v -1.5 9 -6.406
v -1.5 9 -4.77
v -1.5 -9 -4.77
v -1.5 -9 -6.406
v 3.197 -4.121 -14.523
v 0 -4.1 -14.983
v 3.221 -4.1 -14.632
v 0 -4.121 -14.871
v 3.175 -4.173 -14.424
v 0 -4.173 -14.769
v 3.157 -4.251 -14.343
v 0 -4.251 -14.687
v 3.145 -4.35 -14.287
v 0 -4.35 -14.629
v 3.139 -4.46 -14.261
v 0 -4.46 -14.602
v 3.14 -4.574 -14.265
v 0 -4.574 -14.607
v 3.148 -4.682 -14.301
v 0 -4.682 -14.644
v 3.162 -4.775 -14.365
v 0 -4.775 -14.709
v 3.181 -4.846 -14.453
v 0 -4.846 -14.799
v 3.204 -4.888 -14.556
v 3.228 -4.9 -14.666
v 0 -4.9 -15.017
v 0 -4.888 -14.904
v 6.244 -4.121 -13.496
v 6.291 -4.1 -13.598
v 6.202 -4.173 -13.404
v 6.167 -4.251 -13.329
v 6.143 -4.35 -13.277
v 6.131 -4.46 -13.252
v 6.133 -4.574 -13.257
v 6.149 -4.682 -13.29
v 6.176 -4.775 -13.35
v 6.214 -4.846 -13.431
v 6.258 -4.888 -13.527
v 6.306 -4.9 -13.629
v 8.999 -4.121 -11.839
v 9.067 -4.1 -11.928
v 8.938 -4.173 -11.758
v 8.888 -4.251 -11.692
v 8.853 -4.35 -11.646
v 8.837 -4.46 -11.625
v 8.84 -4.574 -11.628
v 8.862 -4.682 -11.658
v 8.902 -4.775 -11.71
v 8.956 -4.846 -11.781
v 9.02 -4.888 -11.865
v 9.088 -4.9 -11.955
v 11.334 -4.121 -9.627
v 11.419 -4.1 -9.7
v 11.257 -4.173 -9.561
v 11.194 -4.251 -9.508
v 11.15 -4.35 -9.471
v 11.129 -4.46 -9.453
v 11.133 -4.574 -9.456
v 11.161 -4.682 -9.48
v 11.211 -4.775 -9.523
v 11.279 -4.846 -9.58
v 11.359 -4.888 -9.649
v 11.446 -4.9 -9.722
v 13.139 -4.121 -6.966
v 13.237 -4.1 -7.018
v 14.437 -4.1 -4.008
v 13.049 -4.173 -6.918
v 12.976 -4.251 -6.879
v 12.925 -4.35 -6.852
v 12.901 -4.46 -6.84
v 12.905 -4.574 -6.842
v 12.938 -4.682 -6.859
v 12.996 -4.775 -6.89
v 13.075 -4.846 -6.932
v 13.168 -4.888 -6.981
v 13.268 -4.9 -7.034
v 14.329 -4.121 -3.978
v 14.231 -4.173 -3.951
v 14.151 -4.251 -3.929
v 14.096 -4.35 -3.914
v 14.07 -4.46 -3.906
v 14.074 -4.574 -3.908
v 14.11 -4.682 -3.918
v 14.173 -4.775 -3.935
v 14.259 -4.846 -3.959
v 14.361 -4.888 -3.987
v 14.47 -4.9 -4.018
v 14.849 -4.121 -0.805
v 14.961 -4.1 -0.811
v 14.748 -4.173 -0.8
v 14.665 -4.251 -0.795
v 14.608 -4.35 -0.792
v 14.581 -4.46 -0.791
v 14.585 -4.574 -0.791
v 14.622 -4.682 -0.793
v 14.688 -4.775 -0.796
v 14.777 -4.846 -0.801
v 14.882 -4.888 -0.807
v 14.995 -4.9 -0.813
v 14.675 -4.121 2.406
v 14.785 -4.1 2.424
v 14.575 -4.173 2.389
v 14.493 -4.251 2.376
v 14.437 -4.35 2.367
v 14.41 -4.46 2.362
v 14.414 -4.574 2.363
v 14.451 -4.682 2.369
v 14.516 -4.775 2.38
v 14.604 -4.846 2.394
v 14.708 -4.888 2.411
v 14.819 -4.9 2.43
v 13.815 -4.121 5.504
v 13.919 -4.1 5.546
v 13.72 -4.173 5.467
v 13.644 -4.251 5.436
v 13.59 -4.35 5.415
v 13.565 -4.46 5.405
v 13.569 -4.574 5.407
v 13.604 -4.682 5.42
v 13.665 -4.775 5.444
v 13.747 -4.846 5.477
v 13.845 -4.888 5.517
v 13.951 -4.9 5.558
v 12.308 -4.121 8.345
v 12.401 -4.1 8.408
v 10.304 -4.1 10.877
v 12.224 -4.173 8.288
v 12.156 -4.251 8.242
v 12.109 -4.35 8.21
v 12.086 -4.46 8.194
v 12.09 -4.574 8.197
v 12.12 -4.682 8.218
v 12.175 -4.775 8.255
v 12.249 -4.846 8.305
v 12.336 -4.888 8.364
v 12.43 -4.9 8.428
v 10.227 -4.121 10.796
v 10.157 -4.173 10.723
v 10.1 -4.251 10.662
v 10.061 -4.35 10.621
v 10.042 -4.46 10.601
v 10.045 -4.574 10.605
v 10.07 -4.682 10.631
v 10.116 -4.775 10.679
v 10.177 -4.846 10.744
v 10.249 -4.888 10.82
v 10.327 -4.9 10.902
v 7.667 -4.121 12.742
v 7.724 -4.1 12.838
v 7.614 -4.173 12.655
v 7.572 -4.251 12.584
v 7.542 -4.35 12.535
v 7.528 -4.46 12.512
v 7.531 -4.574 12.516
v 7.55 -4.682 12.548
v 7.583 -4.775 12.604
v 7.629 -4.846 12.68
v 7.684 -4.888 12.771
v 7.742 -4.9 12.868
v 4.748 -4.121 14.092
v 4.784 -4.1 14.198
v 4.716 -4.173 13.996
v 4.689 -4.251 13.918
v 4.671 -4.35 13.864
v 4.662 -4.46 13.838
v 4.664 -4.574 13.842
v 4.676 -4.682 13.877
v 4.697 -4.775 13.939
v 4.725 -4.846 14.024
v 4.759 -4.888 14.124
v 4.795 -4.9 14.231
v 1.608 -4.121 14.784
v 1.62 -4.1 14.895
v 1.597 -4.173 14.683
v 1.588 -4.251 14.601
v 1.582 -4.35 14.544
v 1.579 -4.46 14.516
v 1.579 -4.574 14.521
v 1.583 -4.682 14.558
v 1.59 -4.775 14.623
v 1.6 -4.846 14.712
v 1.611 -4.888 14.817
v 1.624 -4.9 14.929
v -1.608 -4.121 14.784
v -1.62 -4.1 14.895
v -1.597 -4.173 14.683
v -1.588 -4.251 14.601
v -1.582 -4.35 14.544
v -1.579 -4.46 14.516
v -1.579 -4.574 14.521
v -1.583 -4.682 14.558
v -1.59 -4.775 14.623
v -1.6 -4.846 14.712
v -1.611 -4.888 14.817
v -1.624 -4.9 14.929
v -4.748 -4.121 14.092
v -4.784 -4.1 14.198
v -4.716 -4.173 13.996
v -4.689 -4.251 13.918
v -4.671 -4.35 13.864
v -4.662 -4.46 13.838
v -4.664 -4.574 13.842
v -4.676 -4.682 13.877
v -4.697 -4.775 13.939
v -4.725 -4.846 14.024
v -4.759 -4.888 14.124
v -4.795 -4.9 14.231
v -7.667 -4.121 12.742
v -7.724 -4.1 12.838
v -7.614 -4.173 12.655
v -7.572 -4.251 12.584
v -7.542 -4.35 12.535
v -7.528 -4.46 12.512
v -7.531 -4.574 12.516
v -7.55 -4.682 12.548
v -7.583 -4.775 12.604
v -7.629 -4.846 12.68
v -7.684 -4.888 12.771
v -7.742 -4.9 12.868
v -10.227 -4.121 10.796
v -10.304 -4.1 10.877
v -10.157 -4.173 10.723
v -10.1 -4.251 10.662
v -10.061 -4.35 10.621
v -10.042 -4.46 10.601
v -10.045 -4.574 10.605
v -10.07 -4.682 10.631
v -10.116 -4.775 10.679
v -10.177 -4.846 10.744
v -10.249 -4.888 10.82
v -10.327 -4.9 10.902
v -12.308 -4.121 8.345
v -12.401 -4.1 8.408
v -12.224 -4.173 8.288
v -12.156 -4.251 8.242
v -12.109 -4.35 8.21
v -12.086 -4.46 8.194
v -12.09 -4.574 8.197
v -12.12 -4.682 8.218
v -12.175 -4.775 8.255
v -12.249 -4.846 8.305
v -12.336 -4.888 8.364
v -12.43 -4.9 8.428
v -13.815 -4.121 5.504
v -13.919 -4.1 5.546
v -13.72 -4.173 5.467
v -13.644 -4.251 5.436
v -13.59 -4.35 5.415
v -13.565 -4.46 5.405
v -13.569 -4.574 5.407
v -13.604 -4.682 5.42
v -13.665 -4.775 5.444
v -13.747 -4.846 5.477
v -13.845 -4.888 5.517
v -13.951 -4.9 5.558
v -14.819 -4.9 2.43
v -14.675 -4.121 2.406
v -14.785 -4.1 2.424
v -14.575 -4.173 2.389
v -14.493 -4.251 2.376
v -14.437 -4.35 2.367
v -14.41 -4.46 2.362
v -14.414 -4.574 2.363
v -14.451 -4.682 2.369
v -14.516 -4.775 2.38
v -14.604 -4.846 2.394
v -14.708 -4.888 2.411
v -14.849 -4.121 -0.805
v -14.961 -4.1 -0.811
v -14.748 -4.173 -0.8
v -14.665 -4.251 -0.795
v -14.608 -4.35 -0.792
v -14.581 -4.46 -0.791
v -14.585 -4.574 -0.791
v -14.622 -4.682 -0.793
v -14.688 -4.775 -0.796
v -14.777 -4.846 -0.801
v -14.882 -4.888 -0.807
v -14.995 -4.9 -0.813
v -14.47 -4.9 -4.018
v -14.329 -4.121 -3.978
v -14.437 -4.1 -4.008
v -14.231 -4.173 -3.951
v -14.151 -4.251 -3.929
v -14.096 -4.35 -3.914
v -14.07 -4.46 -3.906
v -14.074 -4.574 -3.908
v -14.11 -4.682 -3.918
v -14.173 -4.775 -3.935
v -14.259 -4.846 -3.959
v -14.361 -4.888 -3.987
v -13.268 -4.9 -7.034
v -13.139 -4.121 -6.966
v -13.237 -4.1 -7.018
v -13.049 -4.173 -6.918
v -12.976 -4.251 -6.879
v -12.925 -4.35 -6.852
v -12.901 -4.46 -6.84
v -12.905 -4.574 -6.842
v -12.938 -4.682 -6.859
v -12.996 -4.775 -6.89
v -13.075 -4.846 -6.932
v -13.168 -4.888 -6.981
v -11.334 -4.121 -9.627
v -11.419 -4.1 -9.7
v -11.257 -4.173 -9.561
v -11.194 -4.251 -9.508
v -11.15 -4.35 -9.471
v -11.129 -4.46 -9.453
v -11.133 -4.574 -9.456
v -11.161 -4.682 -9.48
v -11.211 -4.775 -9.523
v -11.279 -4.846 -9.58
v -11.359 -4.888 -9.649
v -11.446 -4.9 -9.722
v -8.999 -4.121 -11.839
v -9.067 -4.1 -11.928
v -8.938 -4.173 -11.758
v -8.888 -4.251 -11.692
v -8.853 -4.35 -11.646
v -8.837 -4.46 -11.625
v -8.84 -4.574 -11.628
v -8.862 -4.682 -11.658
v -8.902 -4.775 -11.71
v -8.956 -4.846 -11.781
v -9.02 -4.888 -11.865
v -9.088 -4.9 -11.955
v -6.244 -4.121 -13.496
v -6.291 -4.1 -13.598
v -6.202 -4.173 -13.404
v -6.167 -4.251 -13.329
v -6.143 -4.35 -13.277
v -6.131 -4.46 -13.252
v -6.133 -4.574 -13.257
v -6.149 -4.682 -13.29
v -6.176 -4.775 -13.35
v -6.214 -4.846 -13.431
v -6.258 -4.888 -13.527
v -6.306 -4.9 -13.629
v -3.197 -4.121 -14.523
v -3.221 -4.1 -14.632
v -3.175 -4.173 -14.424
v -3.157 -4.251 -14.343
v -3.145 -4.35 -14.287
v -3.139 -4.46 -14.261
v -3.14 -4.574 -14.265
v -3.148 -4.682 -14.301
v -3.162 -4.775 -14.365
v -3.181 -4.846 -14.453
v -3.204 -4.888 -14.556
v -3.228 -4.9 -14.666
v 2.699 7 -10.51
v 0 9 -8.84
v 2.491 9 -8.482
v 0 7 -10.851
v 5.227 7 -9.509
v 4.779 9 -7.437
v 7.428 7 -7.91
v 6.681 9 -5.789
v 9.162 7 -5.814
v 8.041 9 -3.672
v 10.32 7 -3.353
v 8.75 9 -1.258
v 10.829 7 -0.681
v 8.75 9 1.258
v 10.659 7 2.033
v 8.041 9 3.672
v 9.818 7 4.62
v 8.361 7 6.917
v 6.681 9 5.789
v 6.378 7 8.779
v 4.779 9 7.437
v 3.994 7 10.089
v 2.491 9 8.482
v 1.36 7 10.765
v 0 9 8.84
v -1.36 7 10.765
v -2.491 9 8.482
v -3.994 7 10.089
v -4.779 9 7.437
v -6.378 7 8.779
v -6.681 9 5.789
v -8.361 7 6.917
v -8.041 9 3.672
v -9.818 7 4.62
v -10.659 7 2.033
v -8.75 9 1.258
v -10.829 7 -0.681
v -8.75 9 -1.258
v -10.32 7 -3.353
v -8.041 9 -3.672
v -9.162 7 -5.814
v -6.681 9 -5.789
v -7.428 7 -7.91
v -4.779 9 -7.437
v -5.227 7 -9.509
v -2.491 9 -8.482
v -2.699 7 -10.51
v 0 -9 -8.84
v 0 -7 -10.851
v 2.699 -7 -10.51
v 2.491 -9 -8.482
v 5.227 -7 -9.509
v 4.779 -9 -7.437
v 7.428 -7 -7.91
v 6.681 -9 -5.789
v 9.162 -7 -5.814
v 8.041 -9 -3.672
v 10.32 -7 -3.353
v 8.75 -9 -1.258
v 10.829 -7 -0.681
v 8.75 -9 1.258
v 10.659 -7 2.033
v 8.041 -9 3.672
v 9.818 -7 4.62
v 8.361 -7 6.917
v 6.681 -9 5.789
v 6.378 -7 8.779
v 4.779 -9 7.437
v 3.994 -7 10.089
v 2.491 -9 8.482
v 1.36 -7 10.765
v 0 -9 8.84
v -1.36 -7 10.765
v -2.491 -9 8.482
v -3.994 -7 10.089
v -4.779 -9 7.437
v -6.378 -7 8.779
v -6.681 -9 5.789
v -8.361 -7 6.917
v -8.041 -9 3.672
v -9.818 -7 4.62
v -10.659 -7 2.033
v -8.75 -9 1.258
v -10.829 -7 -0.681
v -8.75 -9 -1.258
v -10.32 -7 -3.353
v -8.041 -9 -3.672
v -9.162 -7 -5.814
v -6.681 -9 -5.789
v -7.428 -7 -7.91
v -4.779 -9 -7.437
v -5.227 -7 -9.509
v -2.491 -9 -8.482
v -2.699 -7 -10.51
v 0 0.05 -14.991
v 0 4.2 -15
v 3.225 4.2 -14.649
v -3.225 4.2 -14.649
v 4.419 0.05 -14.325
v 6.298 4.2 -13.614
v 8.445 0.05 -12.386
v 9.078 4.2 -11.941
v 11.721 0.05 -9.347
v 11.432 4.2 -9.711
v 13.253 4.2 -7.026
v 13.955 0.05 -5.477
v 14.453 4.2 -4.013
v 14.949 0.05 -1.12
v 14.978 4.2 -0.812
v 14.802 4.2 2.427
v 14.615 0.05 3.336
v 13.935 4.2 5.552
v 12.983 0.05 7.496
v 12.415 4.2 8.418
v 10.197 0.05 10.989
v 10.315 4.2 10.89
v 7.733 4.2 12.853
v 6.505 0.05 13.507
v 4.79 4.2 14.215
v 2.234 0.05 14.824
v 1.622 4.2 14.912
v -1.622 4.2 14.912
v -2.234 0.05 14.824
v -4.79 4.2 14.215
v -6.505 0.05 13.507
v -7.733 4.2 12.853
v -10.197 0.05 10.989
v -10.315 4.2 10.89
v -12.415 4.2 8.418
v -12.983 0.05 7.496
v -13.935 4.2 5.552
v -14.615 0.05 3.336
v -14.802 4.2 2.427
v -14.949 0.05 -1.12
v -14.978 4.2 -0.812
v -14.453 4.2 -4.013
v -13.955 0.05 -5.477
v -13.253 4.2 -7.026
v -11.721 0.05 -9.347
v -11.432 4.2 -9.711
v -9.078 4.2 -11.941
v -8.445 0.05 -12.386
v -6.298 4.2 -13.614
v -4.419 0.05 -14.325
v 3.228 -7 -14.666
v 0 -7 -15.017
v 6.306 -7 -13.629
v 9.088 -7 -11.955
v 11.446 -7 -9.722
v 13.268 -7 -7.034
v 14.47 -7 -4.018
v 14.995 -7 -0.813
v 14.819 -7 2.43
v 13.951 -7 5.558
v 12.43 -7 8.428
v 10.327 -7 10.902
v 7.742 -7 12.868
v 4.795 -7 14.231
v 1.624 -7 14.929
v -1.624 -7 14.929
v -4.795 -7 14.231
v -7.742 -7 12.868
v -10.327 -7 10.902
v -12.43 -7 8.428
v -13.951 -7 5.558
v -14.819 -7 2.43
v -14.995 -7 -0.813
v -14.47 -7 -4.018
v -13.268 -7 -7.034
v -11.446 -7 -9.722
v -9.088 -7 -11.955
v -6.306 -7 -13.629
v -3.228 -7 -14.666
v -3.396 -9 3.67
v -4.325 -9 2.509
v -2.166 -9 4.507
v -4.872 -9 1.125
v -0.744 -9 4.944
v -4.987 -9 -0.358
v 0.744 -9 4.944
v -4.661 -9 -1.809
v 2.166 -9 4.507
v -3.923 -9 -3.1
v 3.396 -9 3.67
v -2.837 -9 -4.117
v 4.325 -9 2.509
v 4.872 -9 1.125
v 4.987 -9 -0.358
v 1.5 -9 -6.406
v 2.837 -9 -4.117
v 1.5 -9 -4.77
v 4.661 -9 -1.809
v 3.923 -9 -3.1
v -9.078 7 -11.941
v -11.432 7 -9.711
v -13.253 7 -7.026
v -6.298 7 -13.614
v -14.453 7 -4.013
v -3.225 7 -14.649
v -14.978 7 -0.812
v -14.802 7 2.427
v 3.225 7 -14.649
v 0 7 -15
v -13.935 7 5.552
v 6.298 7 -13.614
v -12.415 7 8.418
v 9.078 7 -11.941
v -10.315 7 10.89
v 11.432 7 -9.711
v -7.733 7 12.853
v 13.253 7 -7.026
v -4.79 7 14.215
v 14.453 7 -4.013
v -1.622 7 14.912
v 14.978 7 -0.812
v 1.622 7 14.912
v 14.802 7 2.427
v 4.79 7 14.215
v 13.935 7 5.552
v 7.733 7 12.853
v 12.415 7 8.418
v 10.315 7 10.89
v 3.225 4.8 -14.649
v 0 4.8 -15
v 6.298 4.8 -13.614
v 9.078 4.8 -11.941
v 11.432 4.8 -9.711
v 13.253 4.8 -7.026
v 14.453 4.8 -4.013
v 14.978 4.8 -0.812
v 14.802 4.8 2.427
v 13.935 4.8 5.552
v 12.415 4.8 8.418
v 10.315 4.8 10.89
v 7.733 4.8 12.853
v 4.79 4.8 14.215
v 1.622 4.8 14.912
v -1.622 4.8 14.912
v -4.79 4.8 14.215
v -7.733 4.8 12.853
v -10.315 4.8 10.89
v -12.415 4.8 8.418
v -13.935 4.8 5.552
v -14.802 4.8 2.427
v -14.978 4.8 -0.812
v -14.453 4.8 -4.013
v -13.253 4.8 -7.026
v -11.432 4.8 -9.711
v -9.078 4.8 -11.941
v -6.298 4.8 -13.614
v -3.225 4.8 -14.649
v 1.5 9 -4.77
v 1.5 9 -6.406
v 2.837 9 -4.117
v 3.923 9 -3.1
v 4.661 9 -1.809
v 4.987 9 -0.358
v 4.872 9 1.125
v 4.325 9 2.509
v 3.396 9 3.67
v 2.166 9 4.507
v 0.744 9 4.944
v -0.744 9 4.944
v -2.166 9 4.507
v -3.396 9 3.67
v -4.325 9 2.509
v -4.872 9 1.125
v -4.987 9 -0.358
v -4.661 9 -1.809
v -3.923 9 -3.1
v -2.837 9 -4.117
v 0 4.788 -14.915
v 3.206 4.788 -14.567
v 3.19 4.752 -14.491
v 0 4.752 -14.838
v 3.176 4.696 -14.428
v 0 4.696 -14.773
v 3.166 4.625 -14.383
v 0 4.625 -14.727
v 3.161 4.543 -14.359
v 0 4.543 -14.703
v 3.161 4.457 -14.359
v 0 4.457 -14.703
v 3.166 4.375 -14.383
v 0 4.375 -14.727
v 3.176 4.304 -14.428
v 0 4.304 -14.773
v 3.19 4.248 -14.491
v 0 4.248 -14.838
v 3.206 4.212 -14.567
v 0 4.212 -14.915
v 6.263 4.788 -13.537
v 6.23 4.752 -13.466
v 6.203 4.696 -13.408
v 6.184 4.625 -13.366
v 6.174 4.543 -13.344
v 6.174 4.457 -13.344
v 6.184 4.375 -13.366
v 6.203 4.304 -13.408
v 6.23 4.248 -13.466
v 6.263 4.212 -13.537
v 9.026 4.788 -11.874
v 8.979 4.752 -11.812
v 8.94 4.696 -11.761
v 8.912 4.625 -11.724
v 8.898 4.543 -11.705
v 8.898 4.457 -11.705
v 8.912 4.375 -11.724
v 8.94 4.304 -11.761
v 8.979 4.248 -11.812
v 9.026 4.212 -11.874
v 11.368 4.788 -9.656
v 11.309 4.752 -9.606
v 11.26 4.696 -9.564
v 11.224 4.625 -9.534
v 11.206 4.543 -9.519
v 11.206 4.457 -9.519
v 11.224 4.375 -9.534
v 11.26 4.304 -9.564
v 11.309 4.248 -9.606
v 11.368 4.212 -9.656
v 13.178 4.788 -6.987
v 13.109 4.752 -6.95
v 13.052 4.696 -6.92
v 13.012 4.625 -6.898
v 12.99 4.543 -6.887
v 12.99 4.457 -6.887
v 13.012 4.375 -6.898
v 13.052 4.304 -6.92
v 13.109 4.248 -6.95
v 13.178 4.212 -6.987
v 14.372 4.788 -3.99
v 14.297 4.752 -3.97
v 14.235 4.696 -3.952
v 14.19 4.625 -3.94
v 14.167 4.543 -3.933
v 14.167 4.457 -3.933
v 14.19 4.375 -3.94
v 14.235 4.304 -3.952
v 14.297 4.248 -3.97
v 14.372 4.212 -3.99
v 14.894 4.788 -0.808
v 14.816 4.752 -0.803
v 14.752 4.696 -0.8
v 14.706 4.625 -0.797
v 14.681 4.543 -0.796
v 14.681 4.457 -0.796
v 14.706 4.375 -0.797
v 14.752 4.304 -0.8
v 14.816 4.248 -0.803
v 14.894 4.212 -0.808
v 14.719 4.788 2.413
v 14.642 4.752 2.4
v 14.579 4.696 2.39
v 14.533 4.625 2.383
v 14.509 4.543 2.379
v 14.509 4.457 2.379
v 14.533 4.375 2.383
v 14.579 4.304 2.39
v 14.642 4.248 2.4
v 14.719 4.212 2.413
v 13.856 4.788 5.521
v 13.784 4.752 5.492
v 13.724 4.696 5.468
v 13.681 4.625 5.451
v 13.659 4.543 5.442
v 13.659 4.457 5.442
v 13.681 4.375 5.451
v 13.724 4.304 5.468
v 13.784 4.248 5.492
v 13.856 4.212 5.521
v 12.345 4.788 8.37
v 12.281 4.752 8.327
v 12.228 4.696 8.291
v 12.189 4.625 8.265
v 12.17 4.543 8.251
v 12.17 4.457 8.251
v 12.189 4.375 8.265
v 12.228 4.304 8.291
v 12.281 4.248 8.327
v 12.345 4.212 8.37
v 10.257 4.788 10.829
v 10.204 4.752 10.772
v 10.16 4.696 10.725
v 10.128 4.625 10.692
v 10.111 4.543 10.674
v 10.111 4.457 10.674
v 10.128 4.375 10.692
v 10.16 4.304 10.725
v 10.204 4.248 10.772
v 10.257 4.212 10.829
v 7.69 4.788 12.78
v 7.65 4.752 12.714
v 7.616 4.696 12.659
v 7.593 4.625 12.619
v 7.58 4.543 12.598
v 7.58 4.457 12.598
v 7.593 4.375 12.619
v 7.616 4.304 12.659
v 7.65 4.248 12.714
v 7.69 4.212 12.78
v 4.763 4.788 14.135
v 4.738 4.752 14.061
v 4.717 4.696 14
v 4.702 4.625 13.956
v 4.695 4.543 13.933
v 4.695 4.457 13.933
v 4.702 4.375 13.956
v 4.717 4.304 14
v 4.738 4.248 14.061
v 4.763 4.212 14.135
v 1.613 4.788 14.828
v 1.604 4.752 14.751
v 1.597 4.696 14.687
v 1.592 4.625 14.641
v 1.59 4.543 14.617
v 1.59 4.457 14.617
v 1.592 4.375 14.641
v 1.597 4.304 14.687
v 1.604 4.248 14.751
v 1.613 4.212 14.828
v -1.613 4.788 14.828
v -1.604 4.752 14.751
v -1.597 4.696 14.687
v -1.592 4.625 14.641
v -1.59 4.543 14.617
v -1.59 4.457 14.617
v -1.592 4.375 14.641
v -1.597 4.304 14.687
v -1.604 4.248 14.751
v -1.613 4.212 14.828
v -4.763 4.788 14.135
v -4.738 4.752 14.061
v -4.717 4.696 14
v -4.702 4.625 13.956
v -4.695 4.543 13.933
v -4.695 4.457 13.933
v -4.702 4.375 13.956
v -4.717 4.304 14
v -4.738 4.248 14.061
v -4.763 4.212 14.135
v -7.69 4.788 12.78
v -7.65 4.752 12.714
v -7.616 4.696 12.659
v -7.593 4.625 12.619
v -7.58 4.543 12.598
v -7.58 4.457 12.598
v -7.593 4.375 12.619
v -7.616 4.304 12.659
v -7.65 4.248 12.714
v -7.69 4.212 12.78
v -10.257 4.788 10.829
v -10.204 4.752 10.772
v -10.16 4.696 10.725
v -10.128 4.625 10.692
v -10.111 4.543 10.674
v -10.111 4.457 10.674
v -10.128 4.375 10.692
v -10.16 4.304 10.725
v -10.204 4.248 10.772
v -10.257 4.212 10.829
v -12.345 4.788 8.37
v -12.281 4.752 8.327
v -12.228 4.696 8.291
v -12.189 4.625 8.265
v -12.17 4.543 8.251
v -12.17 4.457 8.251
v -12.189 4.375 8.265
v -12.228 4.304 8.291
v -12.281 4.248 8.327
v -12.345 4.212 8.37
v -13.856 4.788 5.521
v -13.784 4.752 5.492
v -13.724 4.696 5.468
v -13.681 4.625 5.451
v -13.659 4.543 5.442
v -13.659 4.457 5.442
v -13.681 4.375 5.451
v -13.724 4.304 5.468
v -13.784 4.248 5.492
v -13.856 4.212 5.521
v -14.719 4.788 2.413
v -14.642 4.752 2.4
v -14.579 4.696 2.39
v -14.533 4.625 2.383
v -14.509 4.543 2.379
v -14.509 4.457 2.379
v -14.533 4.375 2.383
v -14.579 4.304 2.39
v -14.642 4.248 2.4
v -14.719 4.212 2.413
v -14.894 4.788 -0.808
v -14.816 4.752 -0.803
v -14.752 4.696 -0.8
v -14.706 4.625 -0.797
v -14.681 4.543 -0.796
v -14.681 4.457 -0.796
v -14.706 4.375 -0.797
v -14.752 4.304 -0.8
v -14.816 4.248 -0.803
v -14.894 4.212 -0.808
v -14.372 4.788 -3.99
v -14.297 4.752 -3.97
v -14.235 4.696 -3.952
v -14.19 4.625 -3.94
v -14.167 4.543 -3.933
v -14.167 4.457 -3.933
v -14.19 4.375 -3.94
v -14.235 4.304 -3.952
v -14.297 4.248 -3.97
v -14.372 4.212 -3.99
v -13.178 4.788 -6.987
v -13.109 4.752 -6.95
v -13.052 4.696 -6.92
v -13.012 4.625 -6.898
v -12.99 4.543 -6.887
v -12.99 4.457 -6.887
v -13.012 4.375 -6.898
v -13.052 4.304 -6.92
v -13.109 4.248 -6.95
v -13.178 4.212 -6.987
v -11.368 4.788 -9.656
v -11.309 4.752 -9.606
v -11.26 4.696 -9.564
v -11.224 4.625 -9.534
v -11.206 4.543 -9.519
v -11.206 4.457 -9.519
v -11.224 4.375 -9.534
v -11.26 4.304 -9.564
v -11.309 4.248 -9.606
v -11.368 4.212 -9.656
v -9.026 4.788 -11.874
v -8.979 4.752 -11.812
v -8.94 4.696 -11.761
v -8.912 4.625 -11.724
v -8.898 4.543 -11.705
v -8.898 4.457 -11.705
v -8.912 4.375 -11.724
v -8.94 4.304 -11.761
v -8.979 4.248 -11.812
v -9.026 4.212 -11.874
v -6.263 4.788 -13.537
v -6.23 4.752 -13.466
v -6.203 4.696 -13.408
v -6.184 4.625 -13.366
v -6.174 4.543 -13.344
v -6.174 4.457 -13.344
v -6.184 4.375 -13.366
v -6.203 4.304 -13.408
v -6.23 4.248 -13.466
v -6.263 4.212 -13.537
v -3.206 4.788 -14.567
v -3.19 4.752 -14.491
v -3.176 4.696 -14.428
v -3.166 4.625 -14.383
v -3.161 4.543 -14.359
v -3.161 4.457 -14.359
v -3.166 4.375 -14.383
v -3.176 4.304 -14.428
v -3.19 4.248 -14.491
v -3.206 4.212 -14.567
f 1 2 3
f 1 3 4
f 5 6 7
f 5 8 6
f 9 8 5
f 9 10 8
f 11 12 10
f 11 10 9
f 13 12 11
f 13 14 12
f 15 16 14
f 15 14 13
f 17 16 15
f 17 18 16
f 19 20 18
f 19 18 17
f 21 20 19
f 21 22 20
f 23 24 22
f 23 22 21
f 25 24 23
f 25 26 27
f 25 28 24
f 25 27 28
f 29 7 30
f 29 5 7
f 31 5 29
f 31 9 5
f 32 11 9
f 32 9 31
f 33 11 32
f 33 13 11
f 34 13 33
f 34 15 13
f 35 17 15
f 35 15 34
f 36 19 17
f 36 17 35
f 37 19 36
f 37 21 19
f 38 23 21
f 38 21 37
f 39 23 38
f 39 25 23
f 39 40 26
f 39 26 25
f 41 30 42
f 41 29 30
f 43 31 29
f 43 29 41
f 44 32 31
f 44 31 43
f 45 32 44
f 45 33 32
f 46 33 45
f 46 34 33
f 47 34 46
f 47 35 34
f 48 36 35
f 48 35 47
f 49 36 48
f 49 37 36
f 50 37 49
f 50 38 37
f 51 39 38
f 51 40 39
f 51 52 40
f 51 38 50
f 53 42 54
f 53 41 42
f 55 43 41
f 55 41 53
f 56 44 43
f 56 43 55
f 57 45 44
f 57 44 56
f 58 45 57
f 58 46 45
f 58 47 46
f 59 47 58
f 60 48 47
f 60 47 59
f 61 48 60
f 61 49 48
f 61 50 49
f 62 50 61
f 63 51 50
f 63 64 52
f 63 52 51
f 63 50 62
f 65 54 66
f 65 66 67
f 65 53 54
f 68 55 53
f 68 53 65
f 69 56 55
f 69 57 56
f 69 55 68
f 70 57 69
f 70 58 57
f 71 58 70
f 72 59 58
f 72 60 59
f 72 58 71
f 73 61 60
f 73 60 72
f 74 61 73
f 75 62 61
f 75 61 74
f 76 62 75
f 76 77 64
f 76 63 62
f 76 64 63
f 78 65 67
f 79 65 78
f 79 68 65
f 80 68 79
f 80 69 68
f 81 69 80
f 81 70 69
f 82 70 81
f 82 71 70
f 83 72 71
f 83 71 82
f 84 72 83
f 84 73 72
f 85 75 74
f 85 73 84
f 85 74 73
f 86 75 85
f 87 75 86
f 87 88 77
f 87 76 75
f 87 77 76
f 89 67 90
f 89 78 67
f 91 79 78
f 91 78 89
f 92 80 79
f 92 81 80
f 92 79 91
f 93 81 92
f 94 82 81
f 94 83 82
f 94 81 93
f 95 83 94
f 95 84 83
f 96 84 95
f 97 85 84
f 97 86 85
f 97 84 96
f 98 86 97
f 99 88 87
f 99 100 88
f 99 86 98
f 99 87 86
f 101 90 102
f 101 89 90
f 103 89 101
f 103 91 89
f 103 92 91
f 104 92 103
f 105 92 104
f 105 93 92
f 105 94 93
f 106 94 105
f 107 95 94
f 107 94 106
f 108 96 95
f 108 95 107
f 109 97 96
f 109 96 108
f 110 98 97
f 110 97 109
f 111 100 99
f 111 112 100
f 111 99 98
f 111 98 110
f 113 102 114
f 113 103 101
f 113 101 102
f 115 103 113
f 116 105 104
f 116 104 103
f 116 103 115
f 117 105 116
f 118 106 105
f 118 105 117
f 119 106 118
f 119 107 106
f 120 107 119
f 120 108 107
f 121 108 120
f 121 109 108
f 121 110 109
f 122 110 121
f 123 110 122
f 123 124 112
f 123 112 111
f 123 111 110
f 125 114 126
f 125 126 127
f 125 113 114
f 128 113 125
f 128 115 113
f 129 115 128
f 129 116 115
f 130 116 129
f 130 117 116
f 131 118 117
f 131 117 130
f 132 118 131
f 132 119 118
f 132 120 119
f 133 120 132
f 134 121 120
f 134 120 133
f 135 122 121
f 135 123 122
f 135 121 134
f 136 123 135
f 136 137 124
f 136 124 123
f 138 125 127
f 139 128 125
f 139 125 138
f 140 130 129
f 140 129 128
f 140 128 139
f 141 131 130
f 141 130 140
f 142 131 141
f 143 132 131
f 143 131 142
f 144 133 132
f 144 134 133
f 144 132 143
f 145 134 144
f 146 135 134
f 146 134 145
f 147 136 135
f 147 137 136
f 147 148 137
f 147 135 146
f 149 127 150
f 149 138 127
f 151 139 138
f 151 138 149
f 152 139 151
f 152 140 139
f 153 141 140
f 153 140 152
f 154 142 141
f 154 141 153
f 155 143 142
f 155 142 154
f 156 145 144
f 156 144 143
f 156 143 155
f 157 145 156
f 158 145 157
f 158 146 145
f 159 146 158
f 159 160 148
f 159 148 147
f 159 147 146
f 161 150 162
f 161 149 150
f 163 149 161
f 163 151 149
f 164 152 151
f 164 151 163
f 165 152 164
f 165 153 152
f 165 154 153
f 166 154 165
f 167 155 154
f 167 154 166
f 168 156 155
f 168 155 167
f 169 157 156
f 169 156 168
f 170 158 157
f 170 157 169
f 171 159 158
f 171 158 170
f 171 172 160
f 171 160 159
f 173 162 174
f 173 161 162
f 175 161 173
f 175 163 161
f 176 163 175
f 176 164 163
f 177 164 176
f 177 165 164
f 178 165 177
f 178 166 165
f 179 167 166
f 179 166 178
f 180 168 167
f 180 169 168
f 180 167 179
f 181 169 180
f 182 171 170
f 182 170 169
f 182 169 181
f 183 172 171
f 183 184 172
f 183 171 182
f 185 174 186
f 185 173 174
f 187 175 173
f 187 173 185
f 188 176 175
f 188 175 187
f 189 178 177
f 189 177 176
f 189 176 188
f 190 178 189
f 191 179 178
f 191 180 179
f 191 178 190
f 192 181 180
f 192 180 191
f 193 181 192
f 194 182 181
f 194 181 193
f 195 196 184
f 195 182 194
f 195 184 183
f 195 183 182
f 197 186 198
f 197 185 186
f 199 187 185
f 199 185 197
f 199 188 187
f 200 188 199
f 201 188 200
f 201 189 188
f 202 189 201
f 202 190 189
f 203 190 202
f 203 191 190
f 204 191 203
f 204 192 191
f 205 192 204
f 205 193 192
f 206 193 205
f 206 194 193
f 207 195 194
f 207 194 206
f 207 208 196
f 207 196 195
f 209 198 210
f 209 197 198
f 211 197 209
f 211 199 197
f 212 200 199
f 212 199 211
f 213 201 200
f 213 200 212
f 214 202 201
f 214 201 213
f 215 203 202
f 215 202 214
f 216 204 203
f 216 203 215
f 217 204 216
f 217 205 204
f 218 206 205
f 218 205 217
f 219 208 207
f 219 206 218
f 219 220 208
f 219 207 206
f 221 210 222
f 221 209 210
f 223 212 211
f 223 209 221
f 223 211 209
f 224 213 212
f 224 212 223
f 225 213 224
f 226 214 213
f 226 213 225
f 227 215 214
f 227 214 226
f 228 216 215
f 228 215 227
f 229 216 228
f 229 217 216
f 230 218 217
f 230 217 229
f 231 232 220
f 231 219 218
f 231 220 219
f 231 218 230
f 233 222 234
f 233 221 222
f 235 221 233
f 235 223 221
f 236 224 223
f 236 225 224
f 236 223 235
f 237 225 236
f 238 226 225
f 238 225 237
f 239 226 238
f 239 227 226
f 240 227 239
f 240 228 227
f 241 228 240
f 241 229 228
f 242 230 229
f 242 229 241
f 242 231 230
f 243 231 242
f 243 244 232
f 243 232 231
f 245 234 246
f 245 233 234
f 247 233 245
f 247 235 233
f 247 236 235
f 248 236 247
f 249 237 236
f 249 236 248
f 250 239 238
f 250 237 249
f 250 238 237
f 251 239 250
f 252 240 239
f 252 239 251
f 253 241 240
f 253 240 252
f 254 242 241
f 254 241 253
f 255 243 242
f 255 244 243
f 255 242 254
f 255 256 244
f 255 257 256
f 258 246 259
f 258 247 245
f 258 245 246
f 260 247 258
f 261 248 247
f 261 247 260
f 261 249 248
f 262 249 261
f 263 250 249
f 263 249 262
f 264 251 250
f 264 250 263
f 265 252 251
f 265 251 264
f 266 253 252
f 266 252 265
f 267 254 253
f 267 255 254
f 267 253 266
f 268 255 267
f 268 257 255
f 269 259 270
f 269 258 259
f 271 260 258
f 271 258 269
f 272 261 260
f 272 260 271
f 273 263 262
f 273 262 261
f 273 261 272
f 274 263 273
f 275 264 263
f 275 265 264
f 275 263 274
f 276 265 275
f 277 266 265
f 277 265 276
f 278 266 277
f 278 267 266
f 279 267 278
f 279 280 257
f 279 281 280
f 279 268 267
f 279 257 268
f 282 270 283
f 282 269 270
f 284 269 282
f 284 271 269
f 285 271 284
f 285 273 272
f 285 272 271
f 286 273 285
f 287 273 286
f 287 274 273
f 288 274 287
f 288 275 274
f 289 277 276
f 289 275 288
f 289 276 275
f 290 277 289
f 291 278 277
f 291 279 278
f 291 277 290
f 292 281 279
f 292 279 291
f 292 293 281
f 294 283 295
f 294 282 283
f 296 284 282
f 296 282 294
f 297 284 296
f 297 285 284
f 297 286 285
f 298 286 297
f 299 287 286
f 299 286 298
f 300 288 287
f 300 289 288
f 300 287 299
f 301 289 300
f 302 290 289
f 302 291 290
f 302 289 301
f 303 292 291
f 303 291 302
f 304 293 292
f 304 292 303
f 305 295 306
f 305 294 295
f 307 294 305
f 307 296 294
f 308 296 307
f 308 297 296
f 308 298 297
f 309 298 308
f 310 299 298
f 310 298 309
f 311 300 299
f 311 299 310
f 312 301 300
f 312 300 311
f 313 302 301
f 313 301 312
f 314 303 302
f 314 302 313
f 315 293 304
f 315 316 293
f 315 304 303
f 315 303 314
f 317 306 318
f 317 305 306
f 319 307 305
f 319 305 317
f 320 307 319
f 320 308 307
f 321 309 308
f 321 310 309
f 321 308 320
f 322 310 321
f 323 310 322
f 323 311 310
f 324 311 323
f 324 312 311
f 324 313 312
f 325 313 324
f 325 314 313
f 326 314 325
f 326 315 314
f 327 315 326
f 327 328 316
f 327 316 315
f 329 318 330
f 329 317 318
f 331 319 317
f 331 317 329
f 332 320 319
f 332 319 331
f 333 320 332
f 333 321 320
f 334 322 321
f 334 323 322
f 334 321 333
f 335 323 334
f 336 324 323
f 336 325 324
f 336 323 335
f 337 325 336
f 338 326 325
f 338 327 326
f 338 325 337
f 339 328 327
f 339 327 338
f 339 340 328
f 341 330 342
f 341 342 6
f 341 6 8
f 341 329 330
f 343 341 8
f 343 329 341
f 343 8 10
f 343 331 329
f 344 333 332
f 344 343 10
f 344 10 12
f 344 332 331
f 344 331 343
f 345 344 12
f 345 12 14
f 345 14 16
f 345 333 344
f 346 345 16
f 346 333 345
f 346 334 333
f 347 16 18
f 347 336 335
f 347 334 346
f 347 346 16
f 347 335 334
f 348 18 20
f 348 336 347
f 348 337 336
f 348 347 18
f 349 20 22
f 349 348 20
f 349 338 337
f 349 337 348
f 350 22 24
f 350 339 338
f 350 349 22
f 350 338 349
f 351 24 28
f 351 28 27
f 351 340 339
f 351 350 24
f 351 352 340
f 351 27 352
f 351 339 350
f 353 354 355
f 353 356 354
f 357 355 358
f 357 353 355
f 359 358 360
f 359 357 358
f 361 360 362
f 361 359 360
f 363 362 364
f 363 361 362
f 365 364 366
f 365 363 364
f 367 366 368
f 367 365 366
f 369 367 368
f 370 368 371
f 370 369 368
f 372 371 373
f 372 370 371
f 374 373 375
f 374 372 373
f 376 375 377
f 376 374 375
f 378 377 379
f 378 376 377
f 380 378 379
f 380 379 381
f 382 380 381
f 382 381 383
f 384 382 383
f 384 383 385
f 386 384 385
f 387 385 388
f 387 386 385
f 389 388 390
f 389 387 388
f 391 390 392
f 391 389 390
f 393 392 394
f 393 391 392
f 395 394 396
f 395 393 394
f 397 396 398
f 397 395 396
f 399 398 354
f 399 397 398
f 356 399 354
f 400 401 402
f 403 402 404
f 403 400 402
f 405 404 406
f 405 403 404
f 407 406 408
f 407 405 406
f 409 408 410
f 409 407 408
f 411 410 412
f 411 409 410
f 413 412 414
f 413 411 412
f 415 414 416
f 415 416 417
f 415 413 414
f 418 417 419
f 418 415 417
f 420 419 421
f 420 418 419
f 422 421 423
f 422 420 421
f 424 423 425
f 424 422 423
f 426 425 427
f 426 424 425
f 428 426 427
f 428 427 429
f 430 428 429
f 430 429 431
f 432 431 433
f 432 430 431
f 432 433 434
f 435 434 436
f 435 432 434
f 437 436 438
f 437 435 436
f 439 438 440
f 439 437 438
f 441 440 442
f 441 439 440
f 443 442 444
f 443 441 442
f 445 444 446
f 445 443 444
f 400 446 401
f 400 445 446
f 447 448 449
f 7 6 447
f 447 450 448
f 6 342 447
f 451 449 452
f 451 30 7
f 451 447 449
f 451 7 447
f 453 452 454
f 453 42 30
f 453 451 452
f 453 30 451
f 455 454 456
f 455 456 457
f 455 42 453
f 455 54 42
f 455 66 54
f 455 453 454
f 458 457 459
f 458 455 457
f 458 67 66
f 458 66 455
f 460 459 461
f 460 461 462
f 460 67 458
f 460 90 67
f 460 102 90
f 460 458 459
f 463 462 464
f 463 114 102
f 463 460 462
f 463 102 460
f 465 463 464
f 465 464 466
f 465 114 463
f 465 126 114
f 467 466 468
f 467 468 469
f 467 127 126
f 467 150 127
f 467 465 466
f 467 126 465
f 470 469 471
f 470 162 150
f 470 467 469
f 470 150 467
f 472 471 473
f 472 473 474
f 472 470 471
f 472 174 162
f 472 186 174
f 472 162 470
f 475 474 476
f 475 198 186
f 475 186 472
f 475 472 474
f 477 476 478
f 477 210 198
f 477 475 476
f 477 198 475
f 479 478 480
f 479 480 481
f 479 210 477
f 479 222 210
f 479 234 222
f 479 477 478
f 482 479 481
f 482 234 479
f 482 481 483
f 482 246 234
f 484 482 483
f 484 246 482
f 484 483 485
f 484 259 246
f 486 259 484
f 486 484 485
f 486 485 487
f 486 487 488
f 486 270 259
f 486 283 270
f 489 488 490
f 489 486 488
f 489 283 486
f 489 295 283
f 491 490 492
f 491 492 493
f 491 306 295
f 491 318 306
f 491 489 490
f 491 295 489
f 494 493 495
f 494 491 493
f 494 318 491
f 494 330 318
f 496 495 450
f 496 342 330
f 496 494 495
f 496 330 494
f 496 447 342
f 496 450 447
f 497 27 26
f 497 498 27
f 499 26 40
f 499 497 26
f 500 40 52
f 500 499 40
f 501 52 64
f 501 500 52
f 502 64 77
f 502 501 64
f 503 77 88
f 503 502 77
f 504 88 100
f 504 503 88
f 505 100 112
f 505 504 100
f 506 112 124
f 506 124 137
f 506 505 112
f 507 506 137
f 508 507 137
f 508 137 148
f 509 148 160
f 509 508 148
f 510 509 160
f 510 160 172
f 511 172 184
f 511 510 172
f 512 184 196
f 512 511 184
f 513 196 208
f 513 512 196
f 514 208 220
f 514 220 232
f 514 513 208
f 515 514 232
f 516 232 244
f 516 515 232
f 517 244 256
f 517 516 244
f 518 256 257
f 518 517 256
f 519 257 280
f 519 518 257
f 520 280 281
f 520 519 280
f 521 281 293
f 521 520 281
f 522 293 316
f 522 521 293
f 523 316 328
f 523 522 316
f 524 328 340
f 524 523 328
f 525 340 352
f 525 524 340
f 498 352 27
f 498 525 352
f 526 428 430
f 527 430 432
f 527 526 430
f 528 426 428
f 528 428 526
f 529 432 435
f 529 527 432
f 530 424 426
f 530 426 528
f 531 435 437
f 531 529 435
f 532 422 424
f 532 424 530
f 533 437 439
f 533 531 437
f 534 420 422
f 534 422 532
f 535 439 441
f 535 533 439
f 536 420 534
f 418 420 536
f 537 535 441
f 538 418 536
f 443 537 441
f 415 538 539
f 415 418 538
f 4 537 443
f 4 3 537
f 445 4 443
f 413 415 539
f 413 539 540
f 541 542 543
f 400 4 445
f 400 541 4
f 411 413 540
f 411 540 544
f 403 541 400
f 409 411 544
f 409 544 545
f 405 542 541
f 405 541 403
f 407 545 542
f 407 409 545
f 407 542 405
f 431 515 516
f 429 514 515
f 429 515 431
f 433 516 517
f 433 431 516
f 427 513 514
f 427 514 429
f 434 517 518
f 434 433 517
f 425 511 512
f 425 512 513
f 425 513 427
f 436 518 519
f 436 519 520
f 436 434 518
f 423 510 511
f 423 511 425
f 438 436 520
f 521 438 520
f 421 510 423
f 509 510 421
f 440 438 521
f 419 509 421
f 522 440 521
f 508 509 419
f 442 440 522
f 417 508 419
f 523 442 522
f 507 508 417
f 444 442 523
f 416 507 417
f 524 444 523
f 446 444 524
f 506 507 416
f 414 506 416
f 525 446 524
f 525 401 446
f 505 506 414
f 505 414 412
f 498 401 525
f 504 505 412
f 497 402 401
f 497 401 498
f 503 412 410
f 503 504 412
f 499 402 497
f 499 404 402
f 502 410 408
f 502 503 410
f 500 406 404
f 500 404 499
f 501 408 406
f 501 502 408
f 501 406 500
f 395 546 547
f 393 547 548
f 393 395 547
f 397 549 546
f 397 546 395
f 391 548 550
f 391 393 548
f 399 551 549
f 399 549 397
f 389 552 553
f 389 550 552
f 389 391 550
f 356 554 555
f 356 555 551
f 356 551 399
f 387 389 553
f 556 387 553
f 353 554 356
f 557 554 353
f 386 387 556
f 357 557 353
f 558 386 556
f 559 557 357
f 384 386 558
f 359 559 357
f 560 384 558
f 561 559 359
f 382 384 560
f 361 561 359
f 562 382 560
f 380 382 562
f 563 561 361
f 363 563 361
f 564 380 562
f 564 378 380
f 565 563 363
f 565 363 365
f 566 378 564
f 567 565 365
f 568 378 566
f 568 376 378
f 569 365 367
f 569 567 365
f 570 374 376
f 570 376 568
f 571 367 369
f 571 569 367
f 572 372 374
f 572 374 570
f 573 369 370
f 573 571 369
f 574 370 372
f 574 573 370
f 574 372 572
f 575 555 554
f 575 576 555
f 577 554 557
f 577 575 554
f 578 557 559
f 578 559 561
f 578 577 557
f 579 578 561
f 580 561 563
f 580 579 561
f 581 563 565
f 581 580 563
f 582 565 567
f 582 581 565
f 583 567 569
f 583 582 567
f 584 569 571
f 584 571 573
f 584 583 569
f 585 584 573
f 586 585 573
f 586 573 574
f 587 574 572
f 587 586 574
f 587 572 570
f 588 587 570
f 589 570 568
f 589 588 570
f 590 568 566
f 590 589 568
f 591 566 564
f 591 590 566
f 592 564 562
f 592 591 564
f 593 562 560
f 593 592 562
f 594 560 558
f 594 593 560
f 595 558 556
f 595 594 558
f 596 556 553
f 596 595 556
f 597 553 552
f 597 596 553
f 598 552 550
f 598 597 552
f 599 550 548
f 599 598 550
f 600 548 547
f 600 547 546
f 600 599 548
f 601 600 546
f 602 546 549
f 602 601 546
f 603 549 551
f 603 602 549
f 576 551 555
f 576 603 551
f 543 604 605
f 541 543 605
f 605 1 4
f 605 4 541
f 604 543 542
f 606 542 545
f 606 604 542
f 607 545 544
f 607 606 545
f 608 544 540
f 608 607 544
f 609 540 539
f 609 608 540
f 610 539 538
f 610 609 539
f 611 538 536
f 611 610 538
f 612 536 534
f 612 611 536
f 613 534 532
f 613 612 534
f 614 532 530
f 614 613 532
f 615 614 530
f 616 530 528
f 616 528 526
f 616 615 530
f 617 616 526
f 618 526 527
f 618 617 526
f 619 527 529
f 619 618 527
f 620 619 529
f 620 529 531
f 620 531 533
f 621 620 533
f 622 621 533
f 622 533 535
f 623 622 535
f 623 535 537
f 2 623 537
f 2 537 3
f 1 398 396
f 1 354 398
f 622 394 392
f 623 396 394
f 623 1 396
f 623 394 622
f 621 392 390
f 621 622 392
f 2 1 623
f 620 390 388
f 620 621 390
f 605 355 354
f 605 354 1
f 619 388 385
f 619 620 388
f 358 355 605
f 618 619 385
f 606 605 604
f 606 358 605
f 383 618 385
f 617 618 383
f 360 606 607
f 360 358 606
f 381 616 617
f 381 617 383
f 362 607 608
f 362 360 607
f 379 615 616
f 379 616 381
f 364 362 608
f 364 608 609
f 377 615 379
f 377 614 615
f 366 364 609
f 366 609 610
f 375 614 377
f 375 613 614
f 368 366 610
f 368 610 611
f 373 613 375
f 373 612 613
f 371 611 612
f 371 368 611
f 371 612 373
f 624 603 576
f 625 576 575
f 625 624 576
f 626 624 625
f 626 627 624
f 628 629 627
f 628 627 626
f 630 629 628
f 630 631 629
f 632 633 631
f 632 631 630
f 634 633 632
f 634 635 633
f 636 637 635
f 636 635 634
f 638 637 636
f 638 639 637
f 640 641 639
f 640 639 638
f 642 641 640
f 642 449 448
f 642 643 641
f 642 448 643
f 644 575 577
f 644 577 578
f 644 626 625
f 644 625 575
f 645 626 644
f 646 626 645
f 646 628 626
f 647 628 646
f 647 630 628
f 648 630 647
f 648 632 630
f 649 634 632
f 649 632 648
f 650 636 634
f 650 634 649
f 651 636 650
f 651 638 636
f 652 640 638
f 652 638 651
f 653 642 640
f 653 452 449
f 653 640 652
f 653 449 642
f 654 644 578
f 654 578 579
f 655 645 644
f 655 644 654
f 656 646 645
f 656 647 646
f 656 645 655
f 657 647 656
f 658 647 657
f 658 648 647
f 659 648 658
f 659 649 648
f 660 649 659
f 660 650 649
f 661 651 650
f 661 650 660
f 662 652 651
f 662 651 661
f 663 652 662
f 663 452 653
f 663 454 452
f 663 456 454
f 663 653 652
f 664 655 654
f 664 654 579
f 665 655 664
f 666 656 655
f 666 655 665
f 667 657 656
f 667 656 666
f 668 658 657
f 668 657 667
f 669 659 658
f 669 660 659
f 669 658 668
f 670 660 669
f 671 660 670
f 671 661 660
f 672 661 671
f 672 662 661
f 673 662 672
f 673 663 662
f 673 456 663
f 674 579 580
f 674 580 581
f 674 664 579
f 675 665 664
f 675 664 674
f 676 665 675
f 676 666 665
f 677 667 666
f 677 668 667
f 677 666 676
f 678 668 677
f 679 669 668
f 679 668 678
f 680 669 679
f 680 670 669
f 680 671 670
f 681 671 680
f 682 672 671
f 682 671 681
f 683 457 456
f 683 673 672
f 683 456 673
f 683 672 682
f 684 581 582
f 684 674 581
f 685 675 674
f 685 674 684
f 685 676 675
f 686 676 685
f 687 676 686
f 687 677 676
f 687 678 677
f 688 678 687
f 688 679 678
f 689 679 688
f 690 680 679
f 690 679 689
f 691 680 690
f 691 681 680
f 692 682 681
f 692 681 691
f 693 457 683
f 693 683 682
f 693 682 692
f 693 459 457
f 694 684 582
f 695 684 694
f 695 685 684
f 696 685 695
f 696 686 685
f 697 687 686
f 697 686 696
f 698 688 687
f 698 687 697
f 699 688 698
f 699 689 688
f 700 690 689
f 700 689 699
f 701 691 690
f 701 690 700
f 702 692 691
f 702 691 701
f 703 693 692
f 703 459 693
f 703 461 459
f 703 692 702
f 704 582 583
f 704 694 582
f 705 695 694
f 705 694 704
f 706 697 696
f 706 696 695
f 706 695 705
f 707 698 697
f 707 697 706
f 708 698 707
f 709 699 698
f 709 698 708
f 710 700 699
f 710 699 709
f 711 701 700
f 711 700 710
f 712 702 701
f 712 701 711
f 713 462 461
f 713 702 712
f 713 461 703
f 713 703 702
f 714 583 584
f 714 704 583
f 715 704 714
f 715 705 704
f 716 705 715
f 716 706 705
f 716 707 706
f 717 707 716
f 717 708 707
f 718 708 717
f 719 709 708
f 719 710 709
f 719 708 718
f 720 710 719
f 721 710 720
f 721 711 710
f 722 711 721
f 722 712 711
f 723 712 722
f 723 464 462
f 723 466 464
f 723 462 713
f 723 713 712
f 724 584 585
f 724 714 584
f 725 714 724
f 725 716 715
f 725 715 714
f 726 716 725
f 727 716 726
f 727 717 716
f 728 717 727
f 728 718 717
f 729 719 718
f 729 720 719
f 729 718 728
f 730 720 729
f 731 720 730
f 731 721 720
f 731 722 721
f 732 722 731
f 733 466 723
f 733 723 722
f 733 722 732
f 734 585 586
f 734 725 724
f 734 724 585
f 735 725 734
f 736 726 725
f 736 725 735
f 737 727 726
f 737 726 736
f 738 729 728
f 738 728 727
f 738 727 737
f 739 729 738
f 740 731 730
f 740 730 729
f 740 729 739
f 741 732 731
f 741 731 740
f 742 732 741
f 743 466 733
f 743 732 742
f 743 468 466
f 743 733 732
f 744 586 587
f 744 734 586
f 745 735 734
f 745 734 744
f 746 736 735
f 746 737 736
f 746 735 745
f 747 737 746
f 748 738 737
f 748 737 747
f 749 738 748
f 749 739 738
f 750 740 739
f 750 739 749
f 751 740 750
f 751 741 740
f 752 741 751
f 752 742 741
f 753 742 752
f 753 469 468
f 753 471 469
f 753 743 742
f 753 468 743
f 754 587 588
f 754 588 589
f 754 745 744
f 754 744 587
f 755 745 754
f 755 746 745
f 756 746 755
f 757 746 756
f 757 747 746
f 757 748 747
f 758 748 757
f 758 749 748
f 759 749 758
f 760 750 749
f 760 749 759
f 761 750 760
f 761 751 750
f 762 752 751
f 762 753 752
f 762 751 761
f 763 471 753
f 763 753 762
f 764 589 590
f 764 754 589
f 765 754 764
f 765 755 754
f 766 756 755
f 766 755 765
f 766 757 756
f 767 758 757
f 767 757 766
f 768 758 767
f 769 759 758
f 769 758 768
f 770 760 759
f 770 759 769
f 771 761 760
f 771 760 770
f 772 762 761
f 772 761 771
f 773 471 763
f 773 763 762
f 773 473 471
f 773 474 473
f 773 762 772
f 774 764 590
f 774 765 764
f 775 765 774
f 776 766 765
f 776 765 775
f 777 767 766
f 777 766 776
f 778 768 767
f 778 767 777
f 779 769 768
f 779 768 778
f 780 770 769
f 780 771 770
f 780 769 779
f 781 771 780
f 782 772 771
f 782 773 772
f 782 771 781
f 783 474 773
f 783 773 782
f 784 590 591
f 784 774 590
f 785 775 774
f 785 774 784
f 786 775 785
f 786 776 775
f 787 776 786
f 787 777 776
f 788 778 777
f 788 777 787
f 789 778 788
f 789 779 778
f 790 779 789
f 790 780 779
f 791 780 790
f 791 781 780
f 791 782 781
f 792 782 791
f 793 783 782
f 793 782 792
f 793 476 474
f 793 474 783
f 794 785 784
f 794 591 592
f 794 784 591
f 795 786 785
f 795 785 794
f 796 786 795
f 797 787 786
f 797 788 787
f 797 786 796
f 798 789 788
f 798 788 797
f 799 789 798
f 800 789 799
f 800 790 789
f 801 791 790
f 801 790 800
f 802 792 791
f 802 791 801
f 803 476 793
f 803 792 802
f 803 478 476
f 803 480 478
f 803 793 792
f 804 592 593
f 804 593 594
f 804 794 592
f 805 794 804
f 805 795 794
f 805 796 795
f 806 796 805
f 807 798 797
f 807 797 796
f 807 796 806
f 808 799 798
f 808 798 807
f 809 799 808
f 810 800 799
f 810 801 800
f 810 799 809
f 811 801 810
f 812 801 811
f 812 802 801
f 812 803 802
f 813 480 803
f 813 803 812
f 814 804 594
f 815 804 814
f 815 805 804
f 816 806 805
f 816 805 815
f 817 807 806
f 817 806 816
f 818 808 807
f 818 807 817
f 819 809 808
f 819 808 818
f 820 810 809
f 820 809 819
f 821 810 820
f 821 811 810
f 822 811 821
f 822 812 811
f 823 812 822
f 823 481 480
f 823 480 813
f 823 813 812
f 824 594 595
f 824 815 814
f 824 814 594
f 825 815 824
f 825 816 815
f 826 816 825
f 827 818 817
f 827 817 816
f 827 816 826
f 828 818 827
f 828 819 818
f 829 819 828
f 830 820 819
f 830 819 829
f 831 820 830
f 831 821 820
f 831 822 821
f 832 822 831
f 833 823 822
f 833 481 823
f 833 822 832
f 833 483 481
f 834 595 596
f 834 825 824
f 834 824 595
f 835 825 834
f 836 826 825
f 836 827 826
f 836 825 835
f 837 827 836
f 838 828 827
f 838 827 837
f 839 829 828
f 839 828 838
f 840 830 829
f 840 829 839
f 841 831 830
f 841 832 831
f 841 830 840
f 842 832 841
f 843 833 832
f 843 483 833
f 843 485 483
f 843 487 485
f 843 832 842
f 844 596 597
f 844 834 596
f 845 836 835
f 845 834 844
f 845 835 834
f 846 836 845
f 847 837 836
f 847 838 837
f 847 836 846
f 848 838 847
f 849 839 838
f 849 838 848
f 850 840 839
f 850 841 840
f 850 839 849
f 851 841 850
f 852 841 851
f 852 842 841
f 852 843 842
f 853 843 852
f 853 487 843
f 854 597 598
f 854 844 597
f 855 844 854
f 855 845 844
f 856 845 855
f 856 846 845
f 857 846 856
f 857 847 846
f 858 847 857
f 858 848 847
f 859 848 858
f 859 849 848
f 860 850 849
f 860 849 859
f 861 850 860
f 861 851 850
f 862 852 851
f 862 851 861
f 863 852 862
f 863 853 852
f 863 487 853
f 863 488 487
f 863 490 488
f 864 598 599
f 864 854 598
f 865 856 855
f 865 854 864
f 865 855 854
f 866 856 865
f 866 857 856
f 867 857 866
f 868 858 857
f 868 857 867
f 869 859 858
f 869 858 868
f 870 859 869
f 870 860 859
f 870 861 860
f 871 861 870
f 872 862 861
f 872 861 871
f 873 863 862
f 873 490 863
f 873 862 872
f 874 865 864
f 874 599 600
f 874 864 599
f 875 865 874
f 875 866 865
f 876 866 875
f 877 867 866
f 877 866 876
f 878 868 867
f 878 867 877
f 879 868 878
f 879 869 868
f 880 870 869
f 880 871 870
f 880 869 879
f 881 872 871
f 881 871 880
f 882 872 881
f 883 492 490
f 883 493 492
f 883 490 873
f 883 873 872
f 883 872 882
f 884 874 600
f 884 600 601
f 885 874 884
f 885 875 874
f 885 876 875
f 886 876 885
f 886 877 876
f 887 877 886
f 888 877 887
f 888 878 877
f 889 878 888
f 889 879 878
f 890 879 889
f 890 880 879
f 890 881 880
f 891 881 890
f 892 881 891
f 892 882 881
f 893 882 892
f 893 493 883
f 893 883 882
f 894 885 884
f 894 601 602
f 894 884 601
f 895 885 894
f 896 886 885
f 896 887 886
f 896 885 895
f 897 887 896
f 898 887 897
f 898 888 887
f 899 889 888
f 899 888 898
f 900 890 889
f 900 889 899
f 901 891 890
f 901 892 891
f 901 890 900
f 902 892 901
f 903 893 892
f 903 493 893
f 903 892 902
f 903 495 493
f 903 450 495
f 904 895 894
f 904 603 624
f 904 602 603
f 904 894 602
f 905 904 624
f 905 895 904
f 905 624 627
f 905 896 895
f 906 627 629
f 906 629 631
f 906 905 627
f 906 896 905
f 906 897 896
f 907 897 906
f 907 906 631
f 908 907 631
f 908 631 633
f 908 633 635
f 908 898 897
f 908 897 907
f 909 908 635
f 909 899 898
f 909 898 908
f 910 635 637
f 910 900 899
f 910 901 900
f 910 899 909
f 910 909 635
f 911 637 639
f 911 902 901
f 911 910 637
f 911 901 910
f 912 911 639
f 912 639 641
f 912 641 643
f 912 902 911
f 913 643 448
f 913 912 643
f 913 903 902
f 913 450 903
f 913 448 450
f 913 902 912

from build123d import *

# Parameters (mm, degrees)
SKETCH_2_W          = 3
SKETCH_2_H          = 2.405661247
CUT_EXTRUDE_1_DEPTH = 19


with BuildPart() as part:
    # Эскиз1 → Повернуть1 (revolve)
    with BuildSketch(Plane(origin=(0, 0, 0), x_dir=(0, 0, -1), z_dir=(1, 0, 0))):
        with BuildLine():
            Line((15, 7), (15, 4.8))
            ThreePointArc((15, 4.8), (14.7, 4.5), (15, 4.2))
            Line((15, 4.2), (14.982695469, -4.100374484))
            ThreePointArc((14.982695469, -4.100374484), (14.600374484, -4.517304531), (15.017304531, -4.899625516))
            Line((15.017304531, -4.899625516), (15.017304531, -7))
            Line((15.017304531, -7), (10.850882415, -7))
            Line((10.850882415, -7), (8.840023423, -9))
            Line((8.840023423, -9), (5, -9))
            Line((5, -9), (5, 9))
            Line((5, 9), (8.840023423, 9))
            Line((8.840023423, 9), (10.850882415, 7))
            Line((10.850882415, 7), (15, 7))
        make_face()
    revolve(axis=Axis((0, 26.633173064, 0), (0, -1, 0)))

    # Эскиз2 → Вырез-Вытянуть1 (cut, through all)
    with BuildSketch(Plane(origin=(0, 9, 0), x_dir=(1, 0, 0), z_dir=(0, 1, 0))):
        with Locations((0, 5.202830624)):
            Rectangle(SKETCH_2_W, SKETCH_2_H)
    extrude(amount=-CUT_EXTRUDE_1_DEPTH, mode=Mode.SUBTRACT)


solid = part.part
